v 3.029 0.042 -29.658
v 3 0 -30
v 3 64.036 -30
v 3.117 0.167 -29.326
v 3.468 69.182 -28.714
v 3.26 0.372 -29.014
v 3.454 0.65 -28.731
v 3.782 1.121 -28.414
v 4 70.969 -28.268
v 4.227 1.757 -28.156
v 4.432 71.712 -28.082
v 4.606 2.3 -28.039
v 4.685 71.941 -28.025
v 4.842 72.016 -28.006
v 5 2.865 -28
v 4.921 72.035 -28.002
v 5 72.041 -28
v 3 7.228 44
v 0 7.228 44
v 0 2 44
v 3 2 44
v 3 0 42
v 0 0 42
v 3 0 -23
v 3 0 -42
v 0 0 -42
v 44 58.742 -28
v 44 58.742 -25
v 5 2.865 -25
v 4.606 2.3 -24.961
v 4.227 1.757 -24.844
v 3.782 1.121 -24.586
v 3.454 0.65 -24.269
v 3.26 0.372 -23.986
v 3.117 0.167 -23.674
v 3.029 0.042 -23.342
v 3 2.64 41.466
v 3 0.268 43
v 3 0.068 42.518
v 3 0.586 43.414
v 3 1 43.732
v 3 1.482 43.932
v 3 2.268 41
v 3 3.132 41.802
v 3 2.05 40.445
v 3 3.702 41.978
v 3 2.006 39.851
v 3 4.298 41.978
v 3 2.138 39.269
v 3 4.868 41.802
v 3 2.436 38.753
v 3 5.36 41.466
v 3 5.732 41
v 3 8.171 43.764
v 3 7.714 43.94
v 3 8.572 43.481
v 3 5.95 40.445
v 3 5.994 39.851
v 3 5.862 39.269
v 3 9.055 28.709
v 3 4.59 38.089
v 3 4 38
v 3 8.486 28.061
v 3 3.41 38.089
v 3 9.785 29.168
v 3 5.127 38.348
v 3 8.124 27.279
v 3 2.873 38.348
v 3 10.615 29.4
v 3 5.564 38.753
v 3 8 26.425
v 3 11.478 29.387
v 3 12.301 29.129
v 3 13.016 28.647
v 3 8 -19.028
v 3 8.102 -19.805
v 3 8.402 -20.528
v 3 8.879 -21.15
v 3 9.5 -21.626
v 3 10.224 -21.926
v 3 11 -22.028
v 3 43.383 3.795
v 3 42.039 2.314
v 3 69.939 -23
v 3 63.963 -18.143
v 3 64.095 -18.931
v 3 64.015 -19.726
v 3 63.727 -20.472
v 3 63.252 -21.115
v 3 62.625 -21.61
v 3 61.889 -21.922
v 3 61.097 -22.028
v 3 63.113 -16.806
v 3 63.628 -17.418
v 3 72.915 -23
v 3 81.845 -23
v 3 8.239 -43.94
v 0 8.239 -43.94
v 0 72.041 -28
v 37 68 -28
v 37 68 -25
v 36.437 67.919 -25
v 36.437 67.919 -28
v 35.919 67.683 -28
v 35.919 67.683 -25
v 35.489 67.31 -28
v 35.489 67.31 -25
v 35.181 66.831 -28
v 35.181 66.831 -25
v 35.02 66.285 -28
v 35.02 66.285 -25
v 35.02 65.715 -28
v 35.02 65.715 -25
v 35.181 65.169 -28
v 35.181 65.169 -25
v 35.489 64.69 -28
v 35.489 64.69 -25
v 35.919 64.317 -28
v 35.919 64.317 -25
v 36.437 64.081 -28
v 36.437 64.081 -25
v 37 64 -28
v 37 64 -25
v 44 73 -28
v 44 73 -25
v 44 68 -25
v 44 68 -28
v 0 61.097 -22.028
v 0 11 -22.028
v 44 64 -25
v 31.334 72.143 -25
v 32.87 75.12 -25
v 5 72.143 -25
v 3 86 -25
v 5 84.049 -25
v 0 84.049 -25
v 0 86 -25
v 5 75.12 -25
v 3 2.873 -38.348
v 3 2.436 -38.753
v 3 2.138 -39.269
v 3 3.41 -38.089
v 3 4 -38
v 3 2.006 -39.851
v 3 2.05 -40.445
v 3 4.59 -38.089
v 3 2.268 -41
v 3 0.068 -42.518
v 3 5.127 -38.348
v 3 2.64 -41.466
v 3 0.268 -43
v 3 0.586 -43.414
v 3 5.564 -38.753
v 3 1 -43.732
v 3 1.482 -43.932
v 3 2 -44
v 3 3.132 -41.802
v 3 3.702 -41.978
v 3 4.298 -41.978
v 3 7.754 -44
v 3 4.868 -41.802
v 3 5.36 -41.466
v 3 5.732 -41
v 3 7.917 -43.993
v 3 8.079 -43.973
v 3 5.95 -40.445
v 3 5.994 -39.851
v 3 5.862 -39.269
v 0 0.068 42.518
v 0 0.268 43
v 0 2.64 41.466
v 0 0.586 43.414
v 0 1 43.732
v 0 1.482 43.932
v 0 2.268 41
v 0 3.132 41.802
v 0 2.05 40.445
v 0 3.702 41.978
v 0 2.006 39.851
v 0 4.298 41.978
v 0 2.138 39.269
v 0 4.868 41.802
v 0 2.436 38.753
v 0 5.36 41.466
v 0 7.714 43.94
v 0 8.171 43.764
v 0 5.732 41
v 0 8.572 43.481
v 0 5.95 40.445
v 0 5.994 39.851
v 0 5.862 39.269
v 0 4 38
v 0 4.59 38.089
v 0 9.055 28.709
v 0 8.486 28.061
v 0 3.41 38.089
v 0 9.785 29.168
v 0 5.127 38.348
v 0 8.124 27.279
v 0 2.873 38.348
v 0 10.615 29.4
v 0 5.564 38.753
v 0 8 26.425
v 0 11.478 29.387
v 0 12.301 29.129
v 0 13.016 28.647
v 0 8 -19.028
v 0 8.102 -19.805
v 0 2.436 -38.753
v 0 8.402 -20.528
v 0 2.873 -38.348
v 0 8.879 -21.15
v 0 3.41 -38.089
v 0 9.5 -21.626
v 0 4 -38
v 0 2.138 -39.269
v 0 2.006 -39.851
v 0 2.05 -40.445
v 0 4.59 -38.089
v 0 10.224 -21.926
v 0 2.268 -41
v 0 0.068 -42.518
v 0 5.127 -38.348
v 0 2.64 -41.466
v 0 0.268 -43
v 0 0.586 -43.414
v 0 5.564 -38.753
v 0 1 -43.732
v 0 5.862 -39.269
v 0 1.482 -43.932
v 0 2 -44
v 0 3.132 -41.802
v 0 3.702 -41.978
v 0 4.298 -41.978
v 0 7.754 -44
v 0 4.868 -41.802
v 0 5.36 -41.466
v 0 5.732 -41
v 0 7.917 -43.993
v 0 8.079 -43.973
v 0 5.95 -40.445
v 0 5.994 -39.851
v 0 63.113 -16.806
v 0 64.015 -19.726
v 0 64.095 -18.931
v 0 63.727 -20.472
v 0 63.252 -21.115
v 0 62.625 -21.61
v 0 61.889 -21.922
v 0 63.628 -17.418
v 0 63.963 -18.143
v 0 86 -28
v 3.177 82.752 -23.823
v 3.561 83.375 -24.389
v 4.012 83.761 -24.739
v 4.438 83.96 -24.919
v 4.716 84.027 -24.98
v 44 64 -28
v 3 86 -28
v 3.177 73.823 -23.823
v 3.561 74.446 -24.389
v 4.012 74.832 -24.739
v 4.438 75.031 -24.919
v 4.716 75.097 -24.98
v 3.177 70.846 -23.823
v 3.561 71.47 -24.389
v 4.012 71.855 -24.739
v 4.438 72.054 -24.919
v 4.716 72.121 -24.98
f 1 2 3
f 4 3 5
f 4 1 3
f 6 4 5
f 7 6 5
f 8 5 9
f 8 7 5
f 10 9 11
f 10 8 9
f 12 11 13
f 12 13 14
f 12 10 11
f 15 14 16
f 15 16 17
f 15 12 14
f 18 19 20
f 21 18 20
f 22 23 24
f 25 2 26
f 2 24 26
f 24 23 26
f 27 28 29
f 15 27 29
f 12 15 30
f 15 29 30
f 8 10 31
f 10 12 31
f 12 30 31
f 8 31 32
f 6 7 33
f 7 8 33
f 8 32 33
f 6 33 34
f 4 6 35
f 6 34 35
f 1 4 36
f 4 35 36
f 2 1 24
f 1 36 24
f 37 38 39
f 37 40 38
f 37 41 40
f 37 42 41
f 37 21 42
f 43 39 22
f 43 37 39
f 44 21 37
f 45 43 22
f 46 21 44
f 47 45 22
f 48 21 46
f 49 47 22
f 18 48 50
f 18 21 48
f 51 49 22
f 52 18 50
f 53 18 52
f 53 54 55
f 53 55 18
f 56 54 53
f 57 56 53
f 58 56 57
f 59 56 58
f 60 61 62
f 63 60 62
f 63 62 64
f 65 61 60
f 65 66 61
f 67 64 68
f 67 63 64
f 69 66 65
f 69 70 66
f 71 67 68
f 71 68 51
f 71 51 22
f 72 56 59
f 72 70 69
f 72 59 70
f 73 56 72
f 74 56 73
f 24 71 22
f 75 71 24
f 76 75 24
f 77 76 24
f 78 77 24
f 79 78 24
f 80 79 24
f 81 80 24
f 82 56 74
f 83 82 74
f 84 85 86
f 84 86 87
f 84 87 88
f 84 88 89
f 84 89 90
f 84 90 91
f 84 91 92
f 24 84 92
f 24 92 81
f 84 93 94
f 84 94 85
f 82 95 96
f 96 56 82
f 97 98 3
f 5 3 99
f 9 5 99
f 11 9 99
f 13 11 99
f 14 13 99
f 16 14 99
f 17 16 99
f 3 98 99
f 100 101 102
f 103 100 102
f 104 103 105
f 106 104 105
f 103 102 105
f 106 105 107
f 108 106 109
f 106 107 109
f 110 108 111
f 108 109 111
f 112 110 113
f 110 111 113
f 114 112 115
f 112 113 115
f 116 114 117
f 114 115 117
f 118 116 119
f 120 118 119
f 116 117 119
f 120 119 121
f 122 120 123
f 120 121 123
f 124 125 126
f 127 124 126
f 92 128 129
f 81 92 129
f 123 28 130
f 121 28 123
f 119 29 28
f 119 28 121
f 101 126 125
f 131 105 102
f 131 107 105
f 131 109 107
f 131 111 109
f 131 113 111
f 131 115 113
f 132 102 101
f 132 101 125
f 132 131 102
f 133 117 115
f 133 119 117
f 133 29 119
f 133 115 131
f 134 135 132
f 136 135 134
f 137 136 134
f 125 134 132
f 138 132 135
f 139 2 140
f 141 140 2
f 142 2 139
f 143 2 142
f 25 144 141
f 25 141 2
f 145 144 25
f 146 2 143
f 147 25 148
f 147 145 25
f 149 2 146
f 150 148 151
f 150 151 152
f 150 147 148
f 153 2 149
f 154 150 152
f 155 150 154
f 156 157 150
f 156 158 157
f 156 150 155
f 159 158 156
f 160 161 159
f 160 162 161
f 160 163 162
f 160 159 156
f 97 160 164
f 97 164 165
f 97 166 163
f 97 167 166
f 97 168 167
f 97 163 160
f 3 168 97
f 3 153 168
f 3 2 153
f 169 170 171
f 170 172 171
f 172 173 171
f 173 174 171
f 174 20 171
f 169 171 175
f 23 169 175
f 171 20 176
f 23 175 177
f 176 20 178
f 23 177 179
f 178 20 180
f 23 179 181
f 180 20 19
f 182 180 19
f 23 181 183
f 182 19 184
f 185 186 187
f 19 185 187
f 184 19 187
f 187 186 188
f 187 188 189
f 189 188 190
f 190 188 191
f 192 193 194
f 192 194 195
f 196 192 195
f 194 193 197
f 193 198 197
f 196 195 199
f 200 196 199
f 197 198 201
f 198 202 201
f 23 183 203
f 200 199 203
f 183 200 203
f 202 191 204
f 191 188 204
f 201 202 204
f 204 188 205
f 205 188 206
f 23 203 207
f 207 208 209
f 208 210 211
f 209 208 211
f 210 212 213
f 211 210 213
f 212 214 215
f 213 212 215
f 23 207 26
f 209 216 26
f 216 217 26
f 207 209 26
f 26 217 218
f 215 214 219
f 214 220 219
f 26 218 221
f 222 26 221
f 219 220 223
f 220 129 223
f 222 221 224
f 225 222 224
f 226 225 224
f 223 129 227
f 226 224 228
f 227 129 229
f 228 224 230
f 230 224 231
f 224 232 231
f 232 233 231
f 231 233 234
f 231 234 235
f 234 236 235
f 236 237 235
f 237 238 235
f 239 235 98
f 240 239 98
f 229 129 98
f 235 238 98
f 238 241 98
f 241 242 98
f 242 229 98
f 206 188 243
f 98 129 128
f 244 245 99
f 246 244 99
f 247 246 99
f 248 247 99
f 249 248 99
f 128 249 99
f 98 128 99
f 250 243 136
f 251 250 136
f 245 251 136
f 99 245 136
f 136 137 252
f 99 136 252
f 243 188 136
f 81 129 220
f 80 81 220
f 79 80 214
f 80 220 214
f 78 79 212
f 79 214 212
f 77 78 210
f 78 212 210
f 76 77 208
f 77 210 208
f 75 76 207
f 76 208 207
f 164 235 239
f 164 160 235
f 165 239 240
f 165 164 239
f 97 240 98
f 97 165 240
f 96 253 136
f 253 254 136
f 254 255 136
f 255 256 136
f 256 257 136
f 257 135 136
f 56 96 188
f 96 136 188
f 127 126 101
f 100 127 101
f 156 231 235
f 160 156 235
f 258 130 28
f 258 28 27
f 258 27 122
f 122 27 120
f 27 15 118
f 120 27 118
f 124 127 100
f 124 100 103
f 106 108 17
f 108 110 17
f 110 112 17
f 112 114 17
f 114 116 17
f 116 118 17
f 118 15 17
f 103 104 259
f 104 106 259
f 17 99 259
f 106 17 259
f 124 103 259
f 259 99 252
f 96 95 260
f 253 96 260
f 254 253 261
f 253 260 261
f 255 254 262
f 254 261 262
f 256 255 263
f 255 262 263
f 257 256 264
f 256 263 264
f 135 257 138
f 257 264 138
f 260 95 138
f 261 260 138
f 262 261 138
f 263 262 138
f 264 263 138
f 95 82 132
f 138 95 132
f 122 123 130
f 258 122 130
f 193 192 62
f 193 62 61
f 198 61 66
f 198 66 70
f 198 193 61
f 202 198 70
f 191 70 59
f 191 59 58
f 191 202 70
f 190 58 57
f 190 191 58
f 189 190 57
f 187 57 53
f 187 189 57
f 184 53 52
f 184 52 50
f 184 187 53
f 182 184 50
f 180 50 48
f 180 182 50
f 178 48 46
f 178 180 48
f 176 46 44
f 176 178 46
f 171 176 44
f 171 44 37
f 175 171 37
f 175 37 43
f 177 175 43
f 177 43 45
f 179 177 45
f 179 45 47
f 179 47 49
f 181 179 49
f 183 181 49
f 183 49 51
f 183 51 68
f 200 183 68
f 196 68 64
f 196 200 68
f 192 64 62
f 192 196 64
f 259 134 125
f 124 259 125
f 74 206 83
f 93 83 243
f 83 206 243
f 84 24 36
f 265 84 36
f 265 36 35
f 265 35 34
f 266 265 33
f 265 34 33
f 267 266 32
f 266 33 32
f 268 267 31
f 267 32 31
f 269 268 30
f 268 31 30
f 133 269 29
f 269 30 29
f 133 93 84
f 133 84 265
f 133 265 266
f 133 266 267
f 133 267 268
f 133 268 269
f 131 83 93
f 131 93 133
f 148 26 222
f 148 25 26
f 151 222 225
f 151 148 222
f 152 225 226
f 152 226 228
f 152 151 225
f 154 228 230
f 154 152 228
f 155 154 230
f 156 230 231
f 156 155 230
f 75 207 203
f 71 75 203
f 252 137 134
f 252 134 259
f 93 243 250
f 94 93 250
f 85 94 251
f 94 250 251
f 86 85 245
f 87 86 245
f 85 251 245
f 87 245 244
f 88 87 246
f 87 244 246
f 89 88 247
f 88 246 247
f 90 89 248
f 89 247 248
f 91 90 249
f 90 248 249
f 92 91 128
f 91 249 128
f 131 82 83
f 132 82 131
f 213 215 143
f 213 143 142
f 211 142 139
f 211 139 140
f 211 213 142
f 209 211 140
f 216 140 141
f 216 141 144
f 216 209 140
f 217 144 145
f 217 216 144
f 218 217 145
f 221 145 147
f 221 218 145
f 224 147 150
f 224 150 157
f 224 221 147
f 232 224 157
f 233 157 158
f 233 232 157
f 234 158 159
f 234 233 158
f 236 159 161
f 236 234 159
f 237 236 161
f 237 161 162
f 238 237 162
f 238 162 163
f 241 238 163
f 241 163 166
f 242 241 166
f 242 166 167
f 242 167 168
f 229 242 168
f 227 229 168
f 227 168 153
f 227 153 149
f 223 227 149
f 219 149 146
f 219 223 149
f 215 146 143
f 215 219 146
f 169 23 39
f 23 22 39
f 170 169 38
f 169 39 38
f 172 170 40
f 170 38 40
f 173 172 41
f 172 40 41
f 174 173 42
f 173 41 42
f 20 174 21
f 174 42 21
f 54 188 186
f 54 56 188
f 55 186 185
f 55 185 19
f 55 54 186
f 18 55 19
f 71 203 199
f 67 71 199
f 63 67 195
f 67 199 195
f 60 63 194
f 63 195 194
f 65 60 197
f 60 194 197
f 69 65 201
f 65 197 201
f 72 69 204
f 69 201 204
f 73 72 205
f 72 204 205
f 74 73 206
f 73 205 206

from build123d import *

# Parameters (mm, degrees)
SKETCH_1_R          = 2
EXTRUDE_1_DEPTH     = 3
SKETCH_2_W          = 3
SKETCH_2_H          = 86
EXTRUDE_2_DEPTH     = 44
CUT_EXTRUDE_1_DEPTH = 3
FILLET_1_R          = 2
RIB_2_REACH         = 105.226
SKETCH_8_WALL_W     = 259.89004629
SKETCH_8_WALL_H     = 2
FILLET_2_R          = 2


with BuildPart() as part:
    # Эскиз1 → Бобышка-Вытянуть1 (new body)
    with BuildSketch(Plane(origin=(0, 0, 0), x_dir=(0, 0, -1), z_dir=(1, 0, 0))):
        Polygon((-44, 0), (44, 0), (44, 8), (25, 84.048968678), (-44, 8), align=None)
        with Locations((-40, 4)):
            Circle(SKETCH_1_R, mode=Mode.SUBTRACT)
        with Locations((40, 4)):
            Circle(SKETCH_1_R, mode=Mode.SUBTRACT)
        with BuildLine():
            Line((-28.646958906, 13.01585119), (16.806444582, 63.112727395))
            ThreePointArc((16.806444582, 63.112727395), (20.10865764, 63.895569238), (22.028233046, 61.096876205))
            Line((22.028233046, 61.096876205), (22.028233046, 11))
            ThreePointArc((22.028233046, 11), (21.14955339, 8.878679656), (19.028233046, 8))
            Line((19.028233046, 8), (-26.425170442, 8))
            ThreePointArc((-26.425170442, 8), (-29.168120821, 9.785000735), (-28.646958906, 13.01585119))
        make_face(mode=Mode.SUBTRACT)
    extrude(amount=EXTRUDE_1_DEPTH)

    # Эскиз2 → Бобышка-Вытянуть2 (add)
    with BuildSketch(Plane(origin=(0, 0, 0), x_dir=(0, 0, -1), z_dir=(1, 0, 0))):
        with Locations((26.5, 43)):
            Rectangle(SKETCH_2_W, SKETCH_2_H)
    extrude(amount=EXTRUDE_2_DEPTH)

    # Эскиз3 → Вырез-Вытянуть1 (cut)
    with BuildSketch(Plane.XY.offset(-25)):
        with BuildLine():
            Line((3, 86), (44, 73))
            Line((44, 73), (44, 68))
            Line((44, 68), (37, 68))
            ThreePointArc((37, 68), (35, 66), (37, 64))
            Line((37, 64), (44, 64))
            Line((44, 64), (47.670015823, 64))
            Line((47.670015823, 64), (3, 0))
            Line((3, 0), (48.684950213, 0))
            Line((48.684950213, 0), (53.414147697, 0))
            Line((53.414147697, 0), (53.414147697, 86))
            Line((53.414147697, 86), (3, 86))
        make_face()
    extrude(amount=-CUT_EXTRUDE_1_DEPTH, mode=Mode.SUBTRACT)

    # Скругление1
    fillet_1_edges = [part.edges().sort_by_distance(p)[0] for p in [
        (3, 36.020618391, -28),
        (3, 42.024484339, -25),
    ]]
    fillet(fillet_1_edges, radius=FILLET_1_R)

    # Эскиз8 wall → Ребро2 (add, up to next)
    with BuildSketch(Plane(origin=(17.70715676, 57.665222316, -11.863868016), x_dir=(0.571832945578, 0.60756293308, -0.551248006526), z_dir=(0.82037008865, -0.42349728062, 0.384243374641)), mode=Mode.PRIVATE) as rib_2_sk1:
        with Locations((0, 1)):
            Rectangle(SKETCH_8_WALL_W, SKETCH_8_WALL_H)
    rib_2_tool1 = extrude(rib_2_sk1.sketch, amount=-RIB_2_REACH, mode=Mode.PRIVATE) - part.part
    add(rib_2_tool1.solids().sort_by_distance((17.70715676, 57.665222316, -11.863868016))[0])

    # Скругление2
    fillet_2_edges = [part.edges().sort_by_distance(p)[0] for p in [
        (1.5, 8, -44),
        (1.5, 0, -44),
        (1.5, 8, 44),
        (1.5, 0, 44),
    ]]
    fillet(fillet_2_edges, radius=FILLET_2_R)


solid = part.part
